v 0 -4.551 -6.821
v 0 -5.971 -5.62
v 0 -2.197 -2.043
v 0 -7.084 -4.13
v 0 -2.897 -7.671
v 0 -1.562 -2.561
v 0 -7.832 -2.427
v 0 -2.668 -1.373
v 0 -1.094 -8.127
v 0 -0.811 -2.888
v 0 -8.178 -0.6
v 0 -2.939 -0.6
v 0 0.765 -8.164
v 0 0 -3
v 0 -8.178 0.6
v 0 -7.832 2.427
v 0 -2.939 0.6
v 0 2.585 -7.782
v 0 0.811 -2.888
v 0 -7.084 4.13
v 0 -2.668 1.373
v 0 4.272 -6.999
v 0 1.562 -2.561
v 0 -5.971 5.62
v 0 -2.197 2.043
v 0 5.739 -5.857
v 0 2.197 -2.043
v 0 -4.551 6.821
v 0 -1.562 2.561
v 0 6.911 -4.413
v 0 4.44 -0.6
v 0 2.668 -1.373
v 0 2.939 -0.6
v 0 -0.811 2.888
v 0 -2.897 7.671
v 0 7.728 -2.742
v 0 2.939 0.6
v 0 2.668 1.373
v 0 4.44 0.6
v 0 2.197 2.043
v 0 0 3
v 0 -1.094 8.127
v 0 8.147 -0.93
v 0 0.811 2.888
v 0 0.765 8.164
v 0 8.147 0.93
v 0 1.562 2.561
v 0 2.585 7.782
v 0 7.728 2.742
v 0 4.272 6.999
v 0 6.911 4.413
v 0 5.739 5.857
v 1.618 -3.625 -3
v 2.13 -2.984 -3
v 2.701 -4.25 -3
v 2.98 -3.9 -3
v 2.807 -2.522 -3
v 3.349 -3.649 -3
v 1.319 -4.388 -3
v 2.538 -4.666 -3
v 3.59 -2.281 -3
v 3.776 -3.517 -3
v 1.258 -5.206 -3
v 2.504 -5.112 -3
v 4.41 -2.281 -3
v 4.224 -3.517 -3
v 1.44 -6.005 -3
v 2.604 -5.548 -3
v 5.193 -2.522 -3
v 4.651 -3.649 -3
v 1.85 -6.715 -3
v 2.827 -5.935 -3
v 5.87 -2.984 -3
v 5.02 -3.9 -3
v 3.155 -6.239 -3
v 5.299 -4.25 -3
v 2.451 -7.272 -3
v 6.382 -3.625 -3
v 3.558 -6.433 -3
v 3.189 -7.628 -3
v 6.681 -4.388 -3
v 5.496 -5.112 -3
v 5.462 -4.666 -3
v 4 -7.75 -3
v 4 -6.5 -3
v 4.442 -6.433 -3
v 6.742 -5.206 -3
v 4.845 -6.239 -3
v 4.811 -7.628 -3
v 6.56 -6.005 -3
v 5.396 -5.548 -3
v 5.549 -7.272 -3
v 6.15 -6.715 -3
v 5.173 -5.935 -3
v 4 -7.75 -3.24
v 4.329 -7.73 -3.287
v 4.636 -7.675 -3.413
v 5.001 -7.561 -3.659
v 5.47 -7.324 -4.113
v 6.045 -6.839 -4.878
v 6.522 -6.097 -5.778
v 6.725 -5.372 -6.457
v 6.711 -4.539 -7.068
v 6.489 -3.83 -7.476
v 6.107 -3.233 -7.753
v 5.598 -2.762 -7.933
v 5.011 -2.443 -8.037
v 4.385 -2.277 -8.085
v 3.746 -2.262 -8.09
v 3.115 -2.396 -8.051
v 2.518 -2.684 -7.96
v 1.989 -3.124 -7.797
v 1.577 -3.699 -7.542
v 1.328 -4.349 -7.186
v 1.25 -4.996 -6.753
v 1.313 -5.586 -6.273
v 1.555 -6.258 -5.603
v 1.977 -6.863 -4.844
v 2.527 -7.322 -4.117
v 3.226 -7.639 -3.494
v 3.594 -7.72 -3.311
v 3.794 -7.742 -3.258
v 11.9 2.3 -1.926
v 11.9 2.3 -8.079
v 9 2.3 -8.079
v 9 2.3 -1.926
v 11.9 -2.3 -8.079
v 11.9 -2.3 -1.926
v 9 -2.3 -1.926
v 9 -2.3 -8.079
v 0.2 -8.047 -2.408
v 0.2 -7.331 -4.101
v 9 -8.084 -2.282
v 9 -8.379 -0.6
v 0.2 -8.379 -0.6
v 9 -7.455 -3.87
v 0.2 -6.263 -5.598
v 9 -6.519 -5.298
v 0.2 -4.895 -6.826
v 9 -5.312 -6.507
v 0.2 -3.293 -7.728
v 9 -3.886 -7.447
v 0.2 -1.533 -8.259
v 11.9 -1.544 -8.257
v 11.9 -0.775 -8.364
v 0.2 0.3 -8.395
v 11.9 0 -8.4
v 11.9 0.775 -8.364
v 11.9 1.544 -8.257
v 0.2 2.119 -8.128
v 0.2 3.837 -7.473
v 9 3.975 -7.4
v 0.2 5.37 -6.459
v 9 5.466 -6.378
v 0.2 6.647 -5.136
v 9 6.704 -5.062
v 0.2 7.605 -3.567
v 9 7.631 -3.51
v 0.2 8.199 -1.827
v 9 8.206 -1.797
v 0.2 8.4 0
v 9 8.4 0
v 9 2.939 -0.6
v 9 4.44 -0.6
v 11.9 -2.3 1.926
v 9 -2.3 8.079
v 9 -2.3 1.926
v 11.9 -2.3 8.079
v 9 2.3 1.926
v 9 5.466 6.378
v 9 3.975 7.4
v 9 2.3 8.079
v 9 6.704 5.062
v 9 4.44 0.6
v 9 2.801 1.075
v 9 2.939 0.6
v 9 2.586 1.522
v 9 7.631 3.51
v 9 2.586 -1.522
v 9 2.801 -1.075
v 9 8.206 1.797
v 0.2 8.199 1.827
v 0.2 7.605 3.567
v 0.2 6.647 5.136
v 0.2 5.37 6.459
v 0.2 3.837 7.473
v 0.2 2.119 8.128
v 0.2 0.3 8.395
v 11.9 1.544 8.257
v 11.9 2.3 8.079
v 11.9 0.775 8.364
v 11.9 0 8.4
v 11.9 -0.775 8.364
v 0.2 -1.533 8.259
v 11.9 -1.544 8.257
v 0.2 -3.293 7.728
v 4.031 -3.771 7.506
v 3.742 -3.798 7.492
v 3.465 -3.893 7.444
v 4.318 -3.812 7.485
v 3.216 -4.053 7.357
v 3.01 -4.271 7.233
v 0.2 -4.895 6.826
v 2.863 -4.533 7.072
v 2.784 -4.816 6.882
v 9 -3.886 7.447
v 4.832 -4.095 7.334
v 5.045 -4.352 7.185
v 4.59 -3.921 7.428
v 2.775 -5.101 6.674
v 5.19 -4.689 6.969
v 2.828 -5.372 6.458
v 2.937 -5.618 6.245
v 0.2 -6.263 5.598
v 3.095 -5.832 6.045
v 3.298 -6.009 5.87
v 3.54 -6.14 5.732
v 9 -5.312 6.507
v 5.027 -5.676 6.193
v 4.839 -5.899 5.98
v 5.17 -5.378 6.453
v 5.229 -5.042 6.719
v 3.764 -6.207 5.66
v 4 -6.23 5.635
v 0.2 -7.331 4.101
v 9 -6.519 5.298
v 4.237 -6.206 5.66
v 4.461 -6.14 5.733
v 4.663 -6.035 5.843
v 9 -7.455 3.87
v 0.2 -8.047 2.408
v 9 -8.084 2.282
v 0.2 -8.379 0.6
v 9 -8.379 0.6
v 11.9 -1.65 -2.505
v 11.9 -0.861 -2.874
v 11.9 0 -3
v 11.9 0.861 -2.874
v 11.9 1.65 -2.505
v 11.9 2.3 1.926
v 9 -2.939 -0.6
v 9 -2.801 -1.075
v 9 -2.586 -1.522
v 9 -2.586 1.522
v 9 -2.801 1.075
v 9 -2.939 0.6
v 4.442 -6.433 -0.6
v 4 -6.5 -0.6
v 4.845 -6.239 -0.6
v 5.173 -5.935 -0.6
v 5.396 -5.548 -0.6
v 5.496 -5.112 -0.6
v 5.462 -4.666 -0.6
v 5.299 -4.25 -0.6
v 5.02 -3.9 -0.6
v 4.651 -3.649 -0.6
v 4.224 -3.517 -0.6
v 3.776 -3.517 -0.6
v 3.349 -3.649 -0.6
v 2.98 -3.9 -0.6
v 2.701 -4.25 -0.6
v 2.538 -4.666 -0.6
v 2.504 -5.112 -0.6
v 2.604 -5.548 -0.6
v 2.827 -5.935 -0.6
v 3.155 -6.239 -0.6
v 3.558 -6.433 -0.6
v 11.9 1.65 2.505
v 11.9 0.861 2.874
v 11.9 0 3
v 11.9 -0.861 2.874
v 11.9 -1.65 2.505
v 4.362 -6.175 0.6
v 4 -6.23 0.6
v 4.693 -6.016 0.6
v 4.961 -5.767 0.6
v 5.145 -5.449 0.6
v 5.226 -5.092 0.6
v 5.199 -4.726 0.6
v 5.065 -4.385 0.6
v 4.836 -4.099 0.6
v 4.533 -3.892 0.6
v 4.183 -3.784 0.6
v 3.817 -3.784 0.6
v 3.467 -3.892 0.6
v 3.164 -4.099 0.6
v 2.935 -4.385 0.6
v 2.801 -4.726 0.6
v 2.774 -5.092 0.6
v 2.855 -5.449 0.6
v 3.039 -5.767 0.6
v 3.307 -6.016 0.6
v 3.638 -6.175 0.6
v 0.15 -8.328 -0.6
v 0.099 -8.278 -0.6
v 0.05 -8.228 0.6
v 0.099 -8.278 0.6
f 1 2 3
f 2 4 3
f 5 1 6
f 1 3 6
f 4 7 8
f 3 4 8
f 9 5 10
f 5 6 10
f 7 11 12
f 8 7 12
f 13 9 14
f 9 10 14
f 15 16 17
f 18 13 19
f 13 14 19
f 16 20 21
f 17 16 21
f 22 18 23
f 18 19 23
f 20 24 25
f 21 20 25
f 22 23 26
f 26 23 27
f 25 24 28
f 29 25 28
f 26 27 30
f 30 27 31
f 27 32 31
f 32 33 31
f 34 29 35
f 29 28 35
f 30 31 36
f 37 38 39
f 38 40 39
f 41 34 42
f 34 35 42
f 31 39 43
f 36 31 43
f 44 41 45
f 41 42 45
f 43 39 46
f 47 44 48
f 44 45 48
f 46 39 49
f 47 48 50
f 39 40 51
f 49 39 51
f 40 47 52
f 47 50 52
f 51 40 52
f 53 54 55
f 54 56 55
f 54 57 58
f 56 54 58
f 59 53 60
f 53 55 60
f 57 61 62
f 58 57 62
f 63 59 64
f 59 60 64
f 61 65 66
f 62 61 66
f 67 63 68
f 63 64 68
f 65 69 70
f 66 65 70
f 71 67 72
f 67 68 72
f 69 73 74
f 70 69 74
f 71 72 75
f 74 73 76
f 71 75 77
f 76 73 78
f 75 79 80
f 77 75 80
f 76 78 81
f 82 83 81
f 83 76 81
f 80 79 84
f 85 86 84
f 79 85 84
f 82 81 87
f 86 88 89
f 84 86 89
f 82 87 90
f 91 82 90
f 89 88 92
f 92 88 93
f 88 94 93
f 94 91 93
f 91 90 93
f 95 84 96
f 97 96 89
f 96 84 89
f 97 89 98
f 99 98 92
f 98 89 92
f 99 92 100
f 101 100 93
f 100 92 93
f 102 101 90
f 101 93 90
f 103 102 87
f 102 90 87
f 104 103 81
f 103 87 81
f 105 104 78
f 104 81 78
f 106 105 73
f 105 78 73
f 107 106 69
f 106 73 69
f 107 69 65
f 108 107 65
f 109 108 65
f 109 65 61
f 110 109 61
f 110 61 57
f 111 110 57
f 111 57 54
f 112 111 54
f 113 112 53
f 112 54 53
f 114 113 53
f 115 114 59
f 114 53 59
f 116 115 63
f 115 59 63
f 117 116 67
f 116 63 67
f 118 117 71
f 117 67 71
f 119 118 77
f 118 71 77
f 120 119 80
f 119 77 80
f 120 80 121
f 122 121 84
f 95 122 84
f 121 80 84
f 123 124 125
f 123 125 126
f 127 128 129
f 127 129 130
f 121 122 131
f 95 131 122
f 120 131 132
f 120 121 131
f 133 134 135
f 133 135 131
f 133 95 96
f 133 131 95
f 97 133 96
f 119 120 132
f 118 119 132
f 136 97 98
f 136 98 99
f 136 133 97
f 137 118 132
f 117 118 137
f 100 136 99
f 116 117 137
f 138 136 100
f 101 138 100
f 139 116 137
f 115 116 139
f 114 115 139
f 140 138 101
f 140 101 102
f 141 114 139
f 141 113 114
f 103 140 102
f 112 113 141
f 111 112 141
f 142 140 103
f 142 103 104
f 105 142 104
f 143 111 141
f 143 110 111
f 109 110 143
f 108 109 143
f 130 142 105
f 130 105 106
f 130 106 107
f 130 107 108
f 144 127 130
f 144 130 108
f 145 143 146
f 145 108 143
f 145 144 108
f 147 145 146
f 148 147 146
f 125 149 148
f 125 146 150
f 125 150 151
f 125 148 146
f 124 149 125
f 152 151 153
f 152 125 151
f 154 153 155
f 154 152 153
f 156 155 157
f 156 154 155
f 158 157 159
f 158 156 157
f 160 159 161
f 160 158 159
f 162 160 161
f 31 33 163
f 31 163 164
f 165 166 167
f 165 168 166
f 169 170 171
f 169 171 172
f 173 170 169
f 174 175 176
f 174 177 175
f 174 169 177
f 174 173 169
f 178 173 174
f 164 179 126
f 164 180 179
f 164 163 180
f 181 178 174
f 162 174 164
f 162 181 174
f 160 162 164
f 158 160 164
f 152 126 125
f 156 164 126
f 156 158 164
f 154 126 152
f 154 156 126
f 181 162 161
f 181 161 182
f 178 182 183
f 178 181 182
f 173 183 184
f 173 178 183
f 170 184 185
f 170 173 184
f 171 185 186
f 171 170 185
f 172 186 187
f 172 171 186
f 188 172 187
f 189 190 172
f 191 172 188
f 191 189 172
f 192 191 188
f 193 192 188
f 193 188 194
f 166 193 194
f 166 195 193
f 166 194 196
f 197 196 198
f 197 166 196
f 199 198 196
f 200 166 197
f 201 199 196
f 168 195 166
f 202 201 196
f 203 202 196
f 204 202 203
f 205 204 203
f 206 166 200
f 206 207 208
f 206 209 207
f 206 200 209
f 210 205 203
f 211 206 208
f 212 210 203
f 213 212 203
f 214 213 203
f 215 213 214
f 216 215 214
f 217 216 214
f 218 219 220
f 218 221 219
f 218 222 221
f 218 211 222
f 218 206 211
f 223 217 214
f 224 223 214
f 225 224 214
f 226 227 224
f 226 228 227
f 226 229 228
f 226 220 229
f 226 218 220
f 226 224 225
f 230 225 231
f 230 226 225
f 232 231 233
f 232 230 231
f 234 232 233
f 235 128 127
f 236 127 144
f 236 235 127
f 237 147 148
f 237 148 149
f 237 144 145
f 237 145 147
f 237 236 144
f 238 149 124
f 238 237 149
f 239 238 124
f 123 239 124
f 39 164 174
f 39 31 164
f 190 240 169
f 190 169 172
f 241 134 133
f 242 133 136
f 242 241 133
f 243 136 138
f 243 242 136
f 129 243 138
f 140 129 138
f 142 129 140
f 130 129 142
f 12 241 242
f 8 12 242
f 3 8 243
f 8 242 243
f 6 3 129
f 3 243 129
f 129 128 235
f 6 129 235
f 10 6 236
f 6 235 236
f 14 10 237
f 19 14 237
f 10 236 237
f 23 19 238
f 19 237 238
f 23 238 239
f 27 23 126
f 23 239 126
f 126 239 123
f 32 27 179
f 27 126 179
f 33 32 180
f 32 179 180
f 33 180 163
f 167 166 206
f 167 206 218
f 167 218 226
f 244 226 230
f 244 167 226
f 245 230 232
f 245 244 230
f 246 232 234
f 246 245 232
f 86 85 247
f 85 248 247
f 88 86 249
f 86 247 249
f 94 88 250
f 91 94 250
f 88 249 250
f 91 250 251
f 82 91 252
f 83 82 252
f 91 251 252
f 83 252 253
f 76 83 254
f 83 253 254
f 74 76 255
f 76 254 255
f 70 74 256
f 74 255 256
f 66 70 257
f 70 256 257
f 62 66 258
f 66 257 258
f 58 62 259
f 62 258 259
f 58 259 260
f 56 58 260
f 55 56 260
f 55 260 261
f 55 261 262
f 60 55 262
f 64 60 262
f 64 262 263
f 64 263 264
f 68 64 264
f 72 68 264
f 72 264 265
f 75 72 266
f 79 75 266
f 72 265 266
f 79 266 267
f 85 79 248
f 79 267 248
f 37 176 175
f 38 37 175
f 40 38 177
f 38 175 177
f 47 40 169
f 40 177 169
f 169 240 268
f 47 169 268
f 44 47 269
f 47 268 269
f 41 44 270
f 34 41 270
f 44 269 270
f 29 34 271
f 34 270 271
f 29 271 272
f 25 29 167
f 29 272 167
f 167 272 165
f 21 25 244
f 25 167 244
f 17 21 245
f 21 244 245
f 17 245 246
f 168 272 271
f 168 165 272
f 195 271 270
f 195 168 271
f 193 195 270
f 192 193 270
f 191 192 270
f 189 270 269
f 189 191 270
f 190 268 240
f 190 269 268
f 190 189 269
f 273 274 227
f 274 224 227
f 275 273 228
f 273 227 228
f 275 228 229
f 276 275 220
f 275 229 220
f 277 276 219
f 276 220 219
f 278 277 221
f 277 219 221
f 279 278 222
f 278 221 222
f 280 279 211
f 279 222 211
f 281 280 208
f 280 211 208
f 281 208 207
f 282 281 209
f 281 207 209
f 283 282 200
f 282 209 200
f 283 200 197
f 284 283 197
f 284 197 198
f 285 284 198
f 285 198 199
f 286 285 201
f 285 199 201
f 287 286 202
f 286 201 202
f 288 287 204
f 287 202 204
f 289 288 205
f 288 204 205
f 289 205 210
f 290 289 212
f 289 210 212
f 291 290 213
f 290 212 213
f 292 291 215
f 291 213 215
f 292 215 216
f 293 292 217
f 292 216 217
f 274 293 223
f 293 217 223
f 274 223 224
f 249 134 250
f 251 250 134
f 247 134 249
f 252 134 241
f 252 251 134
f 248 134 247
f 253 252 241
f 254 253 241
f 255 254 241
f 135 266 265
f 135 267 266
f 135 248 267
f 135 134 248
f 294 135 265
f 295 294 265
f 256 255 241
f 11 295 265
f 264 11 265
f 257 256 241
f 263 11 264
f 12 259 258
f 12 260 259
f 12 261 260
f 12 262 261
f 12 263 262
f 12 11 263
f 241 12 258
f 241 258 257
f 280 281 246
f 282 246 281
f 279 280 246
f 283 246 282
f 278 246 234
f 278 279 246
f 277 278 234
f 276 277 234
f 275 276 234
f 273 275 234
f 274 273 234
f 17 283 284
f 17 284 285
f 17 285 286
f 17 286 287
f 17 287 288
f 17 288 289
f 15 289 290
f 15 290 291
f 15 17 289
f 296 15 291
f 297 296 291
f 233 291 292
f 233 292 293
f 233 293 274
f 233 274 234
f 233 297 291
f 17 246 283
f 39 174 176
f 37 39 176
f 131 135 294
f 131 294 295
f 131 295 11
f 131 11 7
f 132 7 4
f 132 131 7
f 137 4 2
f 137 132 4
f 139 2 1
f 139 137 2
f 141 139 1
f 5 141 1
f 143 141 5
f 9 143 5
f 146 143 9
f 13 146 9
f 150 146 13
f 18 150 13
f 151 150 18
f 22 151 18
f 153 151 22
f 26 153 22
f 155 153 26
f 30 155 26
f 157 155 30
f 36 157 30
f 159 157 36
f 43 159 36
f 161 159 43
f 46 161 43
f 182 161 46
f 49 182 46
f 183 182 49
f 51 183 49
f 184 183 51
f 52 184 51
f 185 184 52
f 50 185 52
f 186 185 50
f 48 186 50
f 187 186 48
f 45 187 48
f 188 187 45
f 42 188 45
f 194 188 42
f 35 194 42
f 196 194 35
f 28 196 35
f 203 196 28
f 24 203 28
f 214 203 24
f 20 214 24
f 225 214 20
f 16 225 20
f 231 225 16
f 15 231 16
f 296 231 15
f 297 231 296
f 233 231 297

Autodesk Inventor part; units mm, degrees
sketch "Sketch_1" plane through (0, 0, 0) normal (0, 0, 1) x (1, 0, 0)
  line L0 (11.9, 0) -> (0, 0)
  line L1 (0, 0) -> (0, 8.2)
  line L2 (0, 8.2) -> (0.2, 8.4)
  line L3 (0.2, 8.4) -> (11.9, 8.4)
  line L4 (11.9, 8.4) -> (11.9, 0)
  line L5 (11.9, 0) -> (0, 0)
revolve "Revolution1" add sketch "Sketch_1" angle 360 about axis through (11.9, 0, 0) along (1, 0, 0)
sketch "Sketch_6" plane through (0, 0, 0) normal (1, 0, 0) x (0, 1, 0)
  line L0 (0, 0.6) -> (-8.4, 0.6)
  line L1 (-8.4, 0.6) -> (-8.4, -0.6)
  line L2 (-8.4, -0.6) -> (0, -0.6)
  line L3 (0, -0.6) -> (0, 0.6)
extrude "Extrusion1" cut sketch "Sketch_6" along normal blind 9
sketch "Sketch_7" plane through (4, 0, 0) normal (1, 0, 0) x (0, 0, -1)
  line L0 (-8.4, -5) -> (8.4, -5)
  line L1 (8.4, -5) -> (8.4, -7.75)
  line L2 (8.4, -7.75) -> (3, -7.75)
  line L3 (3, -7.75) -> (3, -6.5)
  line L4 (3, -6.5) -> (0.6, -6.5)
  line L5 (0.6, -6.5) -> (0.6, -5)
  line L6 (0.6, -5) -> (8.4, -5)
revolve "Revolution2" cut sketch "Sketch_7" angle 360 about axis through (4, -5, 8.4) along (0, 0, 1)
sketch "Sketch_13" plane through (4, 0, 0) normal (1, 0, 0) x (0, 0, -1)
  line L0 (-8.4, -5) -> (8.4, -5)
  line L1 (-0.6, -5) -> (-0.6, -6.2295)
  line L2 (-0.6, -6.2295) -> (-8.4, -6.2295)
  line L3 (-8.4, -6.2295) -> (-8.4, -5)
  line L4 (-8.4, -5) -> (-0.6, -5)
revolve "Revolution3" cut sketch "Sketch_13" angle 360 about axis through (4, -5, 8.4) along (0, 0, 1)
thread "Thread1" size "M3x0.5" class "6H" standard "ISO Metric profile" length 4.7207 offset 2.1855
sketch "Sketch_2" plane through (11.9, 0, 0) normal (1, 0, 0) x (0, 0, -1)
  line L0 (-9.4, 8.9) -> (-9.4, -8.9)
  line L1 (-9.4, -8.9) -> (9.4, -8.9)
  line L2 (9.4, -8.9) -> (9.4, 8.9)
  line L3 (9.4, 8.9) -> (-9.4, 8.9)
  line L4 (-8.4, 2.3) -> (-8.4, -2.3)
  line L5 (-8.4, -2.3) -> (8.4, -2.3)
  line L6 (8.4, -2.3) -> (8.4, 2.3)
  line L7 (8.4, 2.3) -> (-8.4, 2.3)
extrude "Extrusion2" cut sketch "Sketch_2" against normal blind 2.9
sketch "Sketch_3" plane through (0, 0, 0) normal (0, 0, 1) x (1, 0, 0)
  line L0 (11.9, 0) -> (0, 0)
  line L1 (0, 0) -> (0, 3)
  line L2 (0, 3) -> (11.9, 3)
  line L3 (11.9, 3) -> (11.9, 0)
  line L4 (11.9, 0) -> (0, 0)
revolve "Revolution4" cut sketch "Sketch_3" angle 360 about axis through (11.9, 0, 0) along (1, 0, 0)
sketch "Sketch_17" plane through (0, 0, 0) normal (1, 0, 0) x (0, 0, -1)
  line L0 (-0.6, 0) -> (0.6, 0)
  line L1 (0.6, 0) -> (0.6, 4.44)
  line L2 (0.6, 4.44) -> (-0.6, 4.44)
  line L3 (-0.6, 4.44) -> (-0.6, 0)
extrude "Extrusion3" cut sketch "Sketch_17" along normal blind 11.9
ref_plane "L_XY" through (12.2, 0, 0) normal (1, 0, 0) x (0, 0, -1)
ref_plane "L_YZ" through (12.2, 0, 0) normal (0, 0, -1) x (0, 1, 0)
ref_plane "L_ZX" through (12.2, 0, 0) normal (0, 1, 0) x (1, 0, 0)
ref_plane "screw_XY" through (4, -5, -3) normal (0, 0, -1) x (1, 0, 0)
ref_plane "screw_YZ" through (4, -5, -3) normal (1, 0, 0) x (0, -1, 0)
ref_plane "screw_ZX" through (4, -5, -3) normal (0, -1, 0) x (0, 0, -1)
properties part number "MCOC17-6_c"
